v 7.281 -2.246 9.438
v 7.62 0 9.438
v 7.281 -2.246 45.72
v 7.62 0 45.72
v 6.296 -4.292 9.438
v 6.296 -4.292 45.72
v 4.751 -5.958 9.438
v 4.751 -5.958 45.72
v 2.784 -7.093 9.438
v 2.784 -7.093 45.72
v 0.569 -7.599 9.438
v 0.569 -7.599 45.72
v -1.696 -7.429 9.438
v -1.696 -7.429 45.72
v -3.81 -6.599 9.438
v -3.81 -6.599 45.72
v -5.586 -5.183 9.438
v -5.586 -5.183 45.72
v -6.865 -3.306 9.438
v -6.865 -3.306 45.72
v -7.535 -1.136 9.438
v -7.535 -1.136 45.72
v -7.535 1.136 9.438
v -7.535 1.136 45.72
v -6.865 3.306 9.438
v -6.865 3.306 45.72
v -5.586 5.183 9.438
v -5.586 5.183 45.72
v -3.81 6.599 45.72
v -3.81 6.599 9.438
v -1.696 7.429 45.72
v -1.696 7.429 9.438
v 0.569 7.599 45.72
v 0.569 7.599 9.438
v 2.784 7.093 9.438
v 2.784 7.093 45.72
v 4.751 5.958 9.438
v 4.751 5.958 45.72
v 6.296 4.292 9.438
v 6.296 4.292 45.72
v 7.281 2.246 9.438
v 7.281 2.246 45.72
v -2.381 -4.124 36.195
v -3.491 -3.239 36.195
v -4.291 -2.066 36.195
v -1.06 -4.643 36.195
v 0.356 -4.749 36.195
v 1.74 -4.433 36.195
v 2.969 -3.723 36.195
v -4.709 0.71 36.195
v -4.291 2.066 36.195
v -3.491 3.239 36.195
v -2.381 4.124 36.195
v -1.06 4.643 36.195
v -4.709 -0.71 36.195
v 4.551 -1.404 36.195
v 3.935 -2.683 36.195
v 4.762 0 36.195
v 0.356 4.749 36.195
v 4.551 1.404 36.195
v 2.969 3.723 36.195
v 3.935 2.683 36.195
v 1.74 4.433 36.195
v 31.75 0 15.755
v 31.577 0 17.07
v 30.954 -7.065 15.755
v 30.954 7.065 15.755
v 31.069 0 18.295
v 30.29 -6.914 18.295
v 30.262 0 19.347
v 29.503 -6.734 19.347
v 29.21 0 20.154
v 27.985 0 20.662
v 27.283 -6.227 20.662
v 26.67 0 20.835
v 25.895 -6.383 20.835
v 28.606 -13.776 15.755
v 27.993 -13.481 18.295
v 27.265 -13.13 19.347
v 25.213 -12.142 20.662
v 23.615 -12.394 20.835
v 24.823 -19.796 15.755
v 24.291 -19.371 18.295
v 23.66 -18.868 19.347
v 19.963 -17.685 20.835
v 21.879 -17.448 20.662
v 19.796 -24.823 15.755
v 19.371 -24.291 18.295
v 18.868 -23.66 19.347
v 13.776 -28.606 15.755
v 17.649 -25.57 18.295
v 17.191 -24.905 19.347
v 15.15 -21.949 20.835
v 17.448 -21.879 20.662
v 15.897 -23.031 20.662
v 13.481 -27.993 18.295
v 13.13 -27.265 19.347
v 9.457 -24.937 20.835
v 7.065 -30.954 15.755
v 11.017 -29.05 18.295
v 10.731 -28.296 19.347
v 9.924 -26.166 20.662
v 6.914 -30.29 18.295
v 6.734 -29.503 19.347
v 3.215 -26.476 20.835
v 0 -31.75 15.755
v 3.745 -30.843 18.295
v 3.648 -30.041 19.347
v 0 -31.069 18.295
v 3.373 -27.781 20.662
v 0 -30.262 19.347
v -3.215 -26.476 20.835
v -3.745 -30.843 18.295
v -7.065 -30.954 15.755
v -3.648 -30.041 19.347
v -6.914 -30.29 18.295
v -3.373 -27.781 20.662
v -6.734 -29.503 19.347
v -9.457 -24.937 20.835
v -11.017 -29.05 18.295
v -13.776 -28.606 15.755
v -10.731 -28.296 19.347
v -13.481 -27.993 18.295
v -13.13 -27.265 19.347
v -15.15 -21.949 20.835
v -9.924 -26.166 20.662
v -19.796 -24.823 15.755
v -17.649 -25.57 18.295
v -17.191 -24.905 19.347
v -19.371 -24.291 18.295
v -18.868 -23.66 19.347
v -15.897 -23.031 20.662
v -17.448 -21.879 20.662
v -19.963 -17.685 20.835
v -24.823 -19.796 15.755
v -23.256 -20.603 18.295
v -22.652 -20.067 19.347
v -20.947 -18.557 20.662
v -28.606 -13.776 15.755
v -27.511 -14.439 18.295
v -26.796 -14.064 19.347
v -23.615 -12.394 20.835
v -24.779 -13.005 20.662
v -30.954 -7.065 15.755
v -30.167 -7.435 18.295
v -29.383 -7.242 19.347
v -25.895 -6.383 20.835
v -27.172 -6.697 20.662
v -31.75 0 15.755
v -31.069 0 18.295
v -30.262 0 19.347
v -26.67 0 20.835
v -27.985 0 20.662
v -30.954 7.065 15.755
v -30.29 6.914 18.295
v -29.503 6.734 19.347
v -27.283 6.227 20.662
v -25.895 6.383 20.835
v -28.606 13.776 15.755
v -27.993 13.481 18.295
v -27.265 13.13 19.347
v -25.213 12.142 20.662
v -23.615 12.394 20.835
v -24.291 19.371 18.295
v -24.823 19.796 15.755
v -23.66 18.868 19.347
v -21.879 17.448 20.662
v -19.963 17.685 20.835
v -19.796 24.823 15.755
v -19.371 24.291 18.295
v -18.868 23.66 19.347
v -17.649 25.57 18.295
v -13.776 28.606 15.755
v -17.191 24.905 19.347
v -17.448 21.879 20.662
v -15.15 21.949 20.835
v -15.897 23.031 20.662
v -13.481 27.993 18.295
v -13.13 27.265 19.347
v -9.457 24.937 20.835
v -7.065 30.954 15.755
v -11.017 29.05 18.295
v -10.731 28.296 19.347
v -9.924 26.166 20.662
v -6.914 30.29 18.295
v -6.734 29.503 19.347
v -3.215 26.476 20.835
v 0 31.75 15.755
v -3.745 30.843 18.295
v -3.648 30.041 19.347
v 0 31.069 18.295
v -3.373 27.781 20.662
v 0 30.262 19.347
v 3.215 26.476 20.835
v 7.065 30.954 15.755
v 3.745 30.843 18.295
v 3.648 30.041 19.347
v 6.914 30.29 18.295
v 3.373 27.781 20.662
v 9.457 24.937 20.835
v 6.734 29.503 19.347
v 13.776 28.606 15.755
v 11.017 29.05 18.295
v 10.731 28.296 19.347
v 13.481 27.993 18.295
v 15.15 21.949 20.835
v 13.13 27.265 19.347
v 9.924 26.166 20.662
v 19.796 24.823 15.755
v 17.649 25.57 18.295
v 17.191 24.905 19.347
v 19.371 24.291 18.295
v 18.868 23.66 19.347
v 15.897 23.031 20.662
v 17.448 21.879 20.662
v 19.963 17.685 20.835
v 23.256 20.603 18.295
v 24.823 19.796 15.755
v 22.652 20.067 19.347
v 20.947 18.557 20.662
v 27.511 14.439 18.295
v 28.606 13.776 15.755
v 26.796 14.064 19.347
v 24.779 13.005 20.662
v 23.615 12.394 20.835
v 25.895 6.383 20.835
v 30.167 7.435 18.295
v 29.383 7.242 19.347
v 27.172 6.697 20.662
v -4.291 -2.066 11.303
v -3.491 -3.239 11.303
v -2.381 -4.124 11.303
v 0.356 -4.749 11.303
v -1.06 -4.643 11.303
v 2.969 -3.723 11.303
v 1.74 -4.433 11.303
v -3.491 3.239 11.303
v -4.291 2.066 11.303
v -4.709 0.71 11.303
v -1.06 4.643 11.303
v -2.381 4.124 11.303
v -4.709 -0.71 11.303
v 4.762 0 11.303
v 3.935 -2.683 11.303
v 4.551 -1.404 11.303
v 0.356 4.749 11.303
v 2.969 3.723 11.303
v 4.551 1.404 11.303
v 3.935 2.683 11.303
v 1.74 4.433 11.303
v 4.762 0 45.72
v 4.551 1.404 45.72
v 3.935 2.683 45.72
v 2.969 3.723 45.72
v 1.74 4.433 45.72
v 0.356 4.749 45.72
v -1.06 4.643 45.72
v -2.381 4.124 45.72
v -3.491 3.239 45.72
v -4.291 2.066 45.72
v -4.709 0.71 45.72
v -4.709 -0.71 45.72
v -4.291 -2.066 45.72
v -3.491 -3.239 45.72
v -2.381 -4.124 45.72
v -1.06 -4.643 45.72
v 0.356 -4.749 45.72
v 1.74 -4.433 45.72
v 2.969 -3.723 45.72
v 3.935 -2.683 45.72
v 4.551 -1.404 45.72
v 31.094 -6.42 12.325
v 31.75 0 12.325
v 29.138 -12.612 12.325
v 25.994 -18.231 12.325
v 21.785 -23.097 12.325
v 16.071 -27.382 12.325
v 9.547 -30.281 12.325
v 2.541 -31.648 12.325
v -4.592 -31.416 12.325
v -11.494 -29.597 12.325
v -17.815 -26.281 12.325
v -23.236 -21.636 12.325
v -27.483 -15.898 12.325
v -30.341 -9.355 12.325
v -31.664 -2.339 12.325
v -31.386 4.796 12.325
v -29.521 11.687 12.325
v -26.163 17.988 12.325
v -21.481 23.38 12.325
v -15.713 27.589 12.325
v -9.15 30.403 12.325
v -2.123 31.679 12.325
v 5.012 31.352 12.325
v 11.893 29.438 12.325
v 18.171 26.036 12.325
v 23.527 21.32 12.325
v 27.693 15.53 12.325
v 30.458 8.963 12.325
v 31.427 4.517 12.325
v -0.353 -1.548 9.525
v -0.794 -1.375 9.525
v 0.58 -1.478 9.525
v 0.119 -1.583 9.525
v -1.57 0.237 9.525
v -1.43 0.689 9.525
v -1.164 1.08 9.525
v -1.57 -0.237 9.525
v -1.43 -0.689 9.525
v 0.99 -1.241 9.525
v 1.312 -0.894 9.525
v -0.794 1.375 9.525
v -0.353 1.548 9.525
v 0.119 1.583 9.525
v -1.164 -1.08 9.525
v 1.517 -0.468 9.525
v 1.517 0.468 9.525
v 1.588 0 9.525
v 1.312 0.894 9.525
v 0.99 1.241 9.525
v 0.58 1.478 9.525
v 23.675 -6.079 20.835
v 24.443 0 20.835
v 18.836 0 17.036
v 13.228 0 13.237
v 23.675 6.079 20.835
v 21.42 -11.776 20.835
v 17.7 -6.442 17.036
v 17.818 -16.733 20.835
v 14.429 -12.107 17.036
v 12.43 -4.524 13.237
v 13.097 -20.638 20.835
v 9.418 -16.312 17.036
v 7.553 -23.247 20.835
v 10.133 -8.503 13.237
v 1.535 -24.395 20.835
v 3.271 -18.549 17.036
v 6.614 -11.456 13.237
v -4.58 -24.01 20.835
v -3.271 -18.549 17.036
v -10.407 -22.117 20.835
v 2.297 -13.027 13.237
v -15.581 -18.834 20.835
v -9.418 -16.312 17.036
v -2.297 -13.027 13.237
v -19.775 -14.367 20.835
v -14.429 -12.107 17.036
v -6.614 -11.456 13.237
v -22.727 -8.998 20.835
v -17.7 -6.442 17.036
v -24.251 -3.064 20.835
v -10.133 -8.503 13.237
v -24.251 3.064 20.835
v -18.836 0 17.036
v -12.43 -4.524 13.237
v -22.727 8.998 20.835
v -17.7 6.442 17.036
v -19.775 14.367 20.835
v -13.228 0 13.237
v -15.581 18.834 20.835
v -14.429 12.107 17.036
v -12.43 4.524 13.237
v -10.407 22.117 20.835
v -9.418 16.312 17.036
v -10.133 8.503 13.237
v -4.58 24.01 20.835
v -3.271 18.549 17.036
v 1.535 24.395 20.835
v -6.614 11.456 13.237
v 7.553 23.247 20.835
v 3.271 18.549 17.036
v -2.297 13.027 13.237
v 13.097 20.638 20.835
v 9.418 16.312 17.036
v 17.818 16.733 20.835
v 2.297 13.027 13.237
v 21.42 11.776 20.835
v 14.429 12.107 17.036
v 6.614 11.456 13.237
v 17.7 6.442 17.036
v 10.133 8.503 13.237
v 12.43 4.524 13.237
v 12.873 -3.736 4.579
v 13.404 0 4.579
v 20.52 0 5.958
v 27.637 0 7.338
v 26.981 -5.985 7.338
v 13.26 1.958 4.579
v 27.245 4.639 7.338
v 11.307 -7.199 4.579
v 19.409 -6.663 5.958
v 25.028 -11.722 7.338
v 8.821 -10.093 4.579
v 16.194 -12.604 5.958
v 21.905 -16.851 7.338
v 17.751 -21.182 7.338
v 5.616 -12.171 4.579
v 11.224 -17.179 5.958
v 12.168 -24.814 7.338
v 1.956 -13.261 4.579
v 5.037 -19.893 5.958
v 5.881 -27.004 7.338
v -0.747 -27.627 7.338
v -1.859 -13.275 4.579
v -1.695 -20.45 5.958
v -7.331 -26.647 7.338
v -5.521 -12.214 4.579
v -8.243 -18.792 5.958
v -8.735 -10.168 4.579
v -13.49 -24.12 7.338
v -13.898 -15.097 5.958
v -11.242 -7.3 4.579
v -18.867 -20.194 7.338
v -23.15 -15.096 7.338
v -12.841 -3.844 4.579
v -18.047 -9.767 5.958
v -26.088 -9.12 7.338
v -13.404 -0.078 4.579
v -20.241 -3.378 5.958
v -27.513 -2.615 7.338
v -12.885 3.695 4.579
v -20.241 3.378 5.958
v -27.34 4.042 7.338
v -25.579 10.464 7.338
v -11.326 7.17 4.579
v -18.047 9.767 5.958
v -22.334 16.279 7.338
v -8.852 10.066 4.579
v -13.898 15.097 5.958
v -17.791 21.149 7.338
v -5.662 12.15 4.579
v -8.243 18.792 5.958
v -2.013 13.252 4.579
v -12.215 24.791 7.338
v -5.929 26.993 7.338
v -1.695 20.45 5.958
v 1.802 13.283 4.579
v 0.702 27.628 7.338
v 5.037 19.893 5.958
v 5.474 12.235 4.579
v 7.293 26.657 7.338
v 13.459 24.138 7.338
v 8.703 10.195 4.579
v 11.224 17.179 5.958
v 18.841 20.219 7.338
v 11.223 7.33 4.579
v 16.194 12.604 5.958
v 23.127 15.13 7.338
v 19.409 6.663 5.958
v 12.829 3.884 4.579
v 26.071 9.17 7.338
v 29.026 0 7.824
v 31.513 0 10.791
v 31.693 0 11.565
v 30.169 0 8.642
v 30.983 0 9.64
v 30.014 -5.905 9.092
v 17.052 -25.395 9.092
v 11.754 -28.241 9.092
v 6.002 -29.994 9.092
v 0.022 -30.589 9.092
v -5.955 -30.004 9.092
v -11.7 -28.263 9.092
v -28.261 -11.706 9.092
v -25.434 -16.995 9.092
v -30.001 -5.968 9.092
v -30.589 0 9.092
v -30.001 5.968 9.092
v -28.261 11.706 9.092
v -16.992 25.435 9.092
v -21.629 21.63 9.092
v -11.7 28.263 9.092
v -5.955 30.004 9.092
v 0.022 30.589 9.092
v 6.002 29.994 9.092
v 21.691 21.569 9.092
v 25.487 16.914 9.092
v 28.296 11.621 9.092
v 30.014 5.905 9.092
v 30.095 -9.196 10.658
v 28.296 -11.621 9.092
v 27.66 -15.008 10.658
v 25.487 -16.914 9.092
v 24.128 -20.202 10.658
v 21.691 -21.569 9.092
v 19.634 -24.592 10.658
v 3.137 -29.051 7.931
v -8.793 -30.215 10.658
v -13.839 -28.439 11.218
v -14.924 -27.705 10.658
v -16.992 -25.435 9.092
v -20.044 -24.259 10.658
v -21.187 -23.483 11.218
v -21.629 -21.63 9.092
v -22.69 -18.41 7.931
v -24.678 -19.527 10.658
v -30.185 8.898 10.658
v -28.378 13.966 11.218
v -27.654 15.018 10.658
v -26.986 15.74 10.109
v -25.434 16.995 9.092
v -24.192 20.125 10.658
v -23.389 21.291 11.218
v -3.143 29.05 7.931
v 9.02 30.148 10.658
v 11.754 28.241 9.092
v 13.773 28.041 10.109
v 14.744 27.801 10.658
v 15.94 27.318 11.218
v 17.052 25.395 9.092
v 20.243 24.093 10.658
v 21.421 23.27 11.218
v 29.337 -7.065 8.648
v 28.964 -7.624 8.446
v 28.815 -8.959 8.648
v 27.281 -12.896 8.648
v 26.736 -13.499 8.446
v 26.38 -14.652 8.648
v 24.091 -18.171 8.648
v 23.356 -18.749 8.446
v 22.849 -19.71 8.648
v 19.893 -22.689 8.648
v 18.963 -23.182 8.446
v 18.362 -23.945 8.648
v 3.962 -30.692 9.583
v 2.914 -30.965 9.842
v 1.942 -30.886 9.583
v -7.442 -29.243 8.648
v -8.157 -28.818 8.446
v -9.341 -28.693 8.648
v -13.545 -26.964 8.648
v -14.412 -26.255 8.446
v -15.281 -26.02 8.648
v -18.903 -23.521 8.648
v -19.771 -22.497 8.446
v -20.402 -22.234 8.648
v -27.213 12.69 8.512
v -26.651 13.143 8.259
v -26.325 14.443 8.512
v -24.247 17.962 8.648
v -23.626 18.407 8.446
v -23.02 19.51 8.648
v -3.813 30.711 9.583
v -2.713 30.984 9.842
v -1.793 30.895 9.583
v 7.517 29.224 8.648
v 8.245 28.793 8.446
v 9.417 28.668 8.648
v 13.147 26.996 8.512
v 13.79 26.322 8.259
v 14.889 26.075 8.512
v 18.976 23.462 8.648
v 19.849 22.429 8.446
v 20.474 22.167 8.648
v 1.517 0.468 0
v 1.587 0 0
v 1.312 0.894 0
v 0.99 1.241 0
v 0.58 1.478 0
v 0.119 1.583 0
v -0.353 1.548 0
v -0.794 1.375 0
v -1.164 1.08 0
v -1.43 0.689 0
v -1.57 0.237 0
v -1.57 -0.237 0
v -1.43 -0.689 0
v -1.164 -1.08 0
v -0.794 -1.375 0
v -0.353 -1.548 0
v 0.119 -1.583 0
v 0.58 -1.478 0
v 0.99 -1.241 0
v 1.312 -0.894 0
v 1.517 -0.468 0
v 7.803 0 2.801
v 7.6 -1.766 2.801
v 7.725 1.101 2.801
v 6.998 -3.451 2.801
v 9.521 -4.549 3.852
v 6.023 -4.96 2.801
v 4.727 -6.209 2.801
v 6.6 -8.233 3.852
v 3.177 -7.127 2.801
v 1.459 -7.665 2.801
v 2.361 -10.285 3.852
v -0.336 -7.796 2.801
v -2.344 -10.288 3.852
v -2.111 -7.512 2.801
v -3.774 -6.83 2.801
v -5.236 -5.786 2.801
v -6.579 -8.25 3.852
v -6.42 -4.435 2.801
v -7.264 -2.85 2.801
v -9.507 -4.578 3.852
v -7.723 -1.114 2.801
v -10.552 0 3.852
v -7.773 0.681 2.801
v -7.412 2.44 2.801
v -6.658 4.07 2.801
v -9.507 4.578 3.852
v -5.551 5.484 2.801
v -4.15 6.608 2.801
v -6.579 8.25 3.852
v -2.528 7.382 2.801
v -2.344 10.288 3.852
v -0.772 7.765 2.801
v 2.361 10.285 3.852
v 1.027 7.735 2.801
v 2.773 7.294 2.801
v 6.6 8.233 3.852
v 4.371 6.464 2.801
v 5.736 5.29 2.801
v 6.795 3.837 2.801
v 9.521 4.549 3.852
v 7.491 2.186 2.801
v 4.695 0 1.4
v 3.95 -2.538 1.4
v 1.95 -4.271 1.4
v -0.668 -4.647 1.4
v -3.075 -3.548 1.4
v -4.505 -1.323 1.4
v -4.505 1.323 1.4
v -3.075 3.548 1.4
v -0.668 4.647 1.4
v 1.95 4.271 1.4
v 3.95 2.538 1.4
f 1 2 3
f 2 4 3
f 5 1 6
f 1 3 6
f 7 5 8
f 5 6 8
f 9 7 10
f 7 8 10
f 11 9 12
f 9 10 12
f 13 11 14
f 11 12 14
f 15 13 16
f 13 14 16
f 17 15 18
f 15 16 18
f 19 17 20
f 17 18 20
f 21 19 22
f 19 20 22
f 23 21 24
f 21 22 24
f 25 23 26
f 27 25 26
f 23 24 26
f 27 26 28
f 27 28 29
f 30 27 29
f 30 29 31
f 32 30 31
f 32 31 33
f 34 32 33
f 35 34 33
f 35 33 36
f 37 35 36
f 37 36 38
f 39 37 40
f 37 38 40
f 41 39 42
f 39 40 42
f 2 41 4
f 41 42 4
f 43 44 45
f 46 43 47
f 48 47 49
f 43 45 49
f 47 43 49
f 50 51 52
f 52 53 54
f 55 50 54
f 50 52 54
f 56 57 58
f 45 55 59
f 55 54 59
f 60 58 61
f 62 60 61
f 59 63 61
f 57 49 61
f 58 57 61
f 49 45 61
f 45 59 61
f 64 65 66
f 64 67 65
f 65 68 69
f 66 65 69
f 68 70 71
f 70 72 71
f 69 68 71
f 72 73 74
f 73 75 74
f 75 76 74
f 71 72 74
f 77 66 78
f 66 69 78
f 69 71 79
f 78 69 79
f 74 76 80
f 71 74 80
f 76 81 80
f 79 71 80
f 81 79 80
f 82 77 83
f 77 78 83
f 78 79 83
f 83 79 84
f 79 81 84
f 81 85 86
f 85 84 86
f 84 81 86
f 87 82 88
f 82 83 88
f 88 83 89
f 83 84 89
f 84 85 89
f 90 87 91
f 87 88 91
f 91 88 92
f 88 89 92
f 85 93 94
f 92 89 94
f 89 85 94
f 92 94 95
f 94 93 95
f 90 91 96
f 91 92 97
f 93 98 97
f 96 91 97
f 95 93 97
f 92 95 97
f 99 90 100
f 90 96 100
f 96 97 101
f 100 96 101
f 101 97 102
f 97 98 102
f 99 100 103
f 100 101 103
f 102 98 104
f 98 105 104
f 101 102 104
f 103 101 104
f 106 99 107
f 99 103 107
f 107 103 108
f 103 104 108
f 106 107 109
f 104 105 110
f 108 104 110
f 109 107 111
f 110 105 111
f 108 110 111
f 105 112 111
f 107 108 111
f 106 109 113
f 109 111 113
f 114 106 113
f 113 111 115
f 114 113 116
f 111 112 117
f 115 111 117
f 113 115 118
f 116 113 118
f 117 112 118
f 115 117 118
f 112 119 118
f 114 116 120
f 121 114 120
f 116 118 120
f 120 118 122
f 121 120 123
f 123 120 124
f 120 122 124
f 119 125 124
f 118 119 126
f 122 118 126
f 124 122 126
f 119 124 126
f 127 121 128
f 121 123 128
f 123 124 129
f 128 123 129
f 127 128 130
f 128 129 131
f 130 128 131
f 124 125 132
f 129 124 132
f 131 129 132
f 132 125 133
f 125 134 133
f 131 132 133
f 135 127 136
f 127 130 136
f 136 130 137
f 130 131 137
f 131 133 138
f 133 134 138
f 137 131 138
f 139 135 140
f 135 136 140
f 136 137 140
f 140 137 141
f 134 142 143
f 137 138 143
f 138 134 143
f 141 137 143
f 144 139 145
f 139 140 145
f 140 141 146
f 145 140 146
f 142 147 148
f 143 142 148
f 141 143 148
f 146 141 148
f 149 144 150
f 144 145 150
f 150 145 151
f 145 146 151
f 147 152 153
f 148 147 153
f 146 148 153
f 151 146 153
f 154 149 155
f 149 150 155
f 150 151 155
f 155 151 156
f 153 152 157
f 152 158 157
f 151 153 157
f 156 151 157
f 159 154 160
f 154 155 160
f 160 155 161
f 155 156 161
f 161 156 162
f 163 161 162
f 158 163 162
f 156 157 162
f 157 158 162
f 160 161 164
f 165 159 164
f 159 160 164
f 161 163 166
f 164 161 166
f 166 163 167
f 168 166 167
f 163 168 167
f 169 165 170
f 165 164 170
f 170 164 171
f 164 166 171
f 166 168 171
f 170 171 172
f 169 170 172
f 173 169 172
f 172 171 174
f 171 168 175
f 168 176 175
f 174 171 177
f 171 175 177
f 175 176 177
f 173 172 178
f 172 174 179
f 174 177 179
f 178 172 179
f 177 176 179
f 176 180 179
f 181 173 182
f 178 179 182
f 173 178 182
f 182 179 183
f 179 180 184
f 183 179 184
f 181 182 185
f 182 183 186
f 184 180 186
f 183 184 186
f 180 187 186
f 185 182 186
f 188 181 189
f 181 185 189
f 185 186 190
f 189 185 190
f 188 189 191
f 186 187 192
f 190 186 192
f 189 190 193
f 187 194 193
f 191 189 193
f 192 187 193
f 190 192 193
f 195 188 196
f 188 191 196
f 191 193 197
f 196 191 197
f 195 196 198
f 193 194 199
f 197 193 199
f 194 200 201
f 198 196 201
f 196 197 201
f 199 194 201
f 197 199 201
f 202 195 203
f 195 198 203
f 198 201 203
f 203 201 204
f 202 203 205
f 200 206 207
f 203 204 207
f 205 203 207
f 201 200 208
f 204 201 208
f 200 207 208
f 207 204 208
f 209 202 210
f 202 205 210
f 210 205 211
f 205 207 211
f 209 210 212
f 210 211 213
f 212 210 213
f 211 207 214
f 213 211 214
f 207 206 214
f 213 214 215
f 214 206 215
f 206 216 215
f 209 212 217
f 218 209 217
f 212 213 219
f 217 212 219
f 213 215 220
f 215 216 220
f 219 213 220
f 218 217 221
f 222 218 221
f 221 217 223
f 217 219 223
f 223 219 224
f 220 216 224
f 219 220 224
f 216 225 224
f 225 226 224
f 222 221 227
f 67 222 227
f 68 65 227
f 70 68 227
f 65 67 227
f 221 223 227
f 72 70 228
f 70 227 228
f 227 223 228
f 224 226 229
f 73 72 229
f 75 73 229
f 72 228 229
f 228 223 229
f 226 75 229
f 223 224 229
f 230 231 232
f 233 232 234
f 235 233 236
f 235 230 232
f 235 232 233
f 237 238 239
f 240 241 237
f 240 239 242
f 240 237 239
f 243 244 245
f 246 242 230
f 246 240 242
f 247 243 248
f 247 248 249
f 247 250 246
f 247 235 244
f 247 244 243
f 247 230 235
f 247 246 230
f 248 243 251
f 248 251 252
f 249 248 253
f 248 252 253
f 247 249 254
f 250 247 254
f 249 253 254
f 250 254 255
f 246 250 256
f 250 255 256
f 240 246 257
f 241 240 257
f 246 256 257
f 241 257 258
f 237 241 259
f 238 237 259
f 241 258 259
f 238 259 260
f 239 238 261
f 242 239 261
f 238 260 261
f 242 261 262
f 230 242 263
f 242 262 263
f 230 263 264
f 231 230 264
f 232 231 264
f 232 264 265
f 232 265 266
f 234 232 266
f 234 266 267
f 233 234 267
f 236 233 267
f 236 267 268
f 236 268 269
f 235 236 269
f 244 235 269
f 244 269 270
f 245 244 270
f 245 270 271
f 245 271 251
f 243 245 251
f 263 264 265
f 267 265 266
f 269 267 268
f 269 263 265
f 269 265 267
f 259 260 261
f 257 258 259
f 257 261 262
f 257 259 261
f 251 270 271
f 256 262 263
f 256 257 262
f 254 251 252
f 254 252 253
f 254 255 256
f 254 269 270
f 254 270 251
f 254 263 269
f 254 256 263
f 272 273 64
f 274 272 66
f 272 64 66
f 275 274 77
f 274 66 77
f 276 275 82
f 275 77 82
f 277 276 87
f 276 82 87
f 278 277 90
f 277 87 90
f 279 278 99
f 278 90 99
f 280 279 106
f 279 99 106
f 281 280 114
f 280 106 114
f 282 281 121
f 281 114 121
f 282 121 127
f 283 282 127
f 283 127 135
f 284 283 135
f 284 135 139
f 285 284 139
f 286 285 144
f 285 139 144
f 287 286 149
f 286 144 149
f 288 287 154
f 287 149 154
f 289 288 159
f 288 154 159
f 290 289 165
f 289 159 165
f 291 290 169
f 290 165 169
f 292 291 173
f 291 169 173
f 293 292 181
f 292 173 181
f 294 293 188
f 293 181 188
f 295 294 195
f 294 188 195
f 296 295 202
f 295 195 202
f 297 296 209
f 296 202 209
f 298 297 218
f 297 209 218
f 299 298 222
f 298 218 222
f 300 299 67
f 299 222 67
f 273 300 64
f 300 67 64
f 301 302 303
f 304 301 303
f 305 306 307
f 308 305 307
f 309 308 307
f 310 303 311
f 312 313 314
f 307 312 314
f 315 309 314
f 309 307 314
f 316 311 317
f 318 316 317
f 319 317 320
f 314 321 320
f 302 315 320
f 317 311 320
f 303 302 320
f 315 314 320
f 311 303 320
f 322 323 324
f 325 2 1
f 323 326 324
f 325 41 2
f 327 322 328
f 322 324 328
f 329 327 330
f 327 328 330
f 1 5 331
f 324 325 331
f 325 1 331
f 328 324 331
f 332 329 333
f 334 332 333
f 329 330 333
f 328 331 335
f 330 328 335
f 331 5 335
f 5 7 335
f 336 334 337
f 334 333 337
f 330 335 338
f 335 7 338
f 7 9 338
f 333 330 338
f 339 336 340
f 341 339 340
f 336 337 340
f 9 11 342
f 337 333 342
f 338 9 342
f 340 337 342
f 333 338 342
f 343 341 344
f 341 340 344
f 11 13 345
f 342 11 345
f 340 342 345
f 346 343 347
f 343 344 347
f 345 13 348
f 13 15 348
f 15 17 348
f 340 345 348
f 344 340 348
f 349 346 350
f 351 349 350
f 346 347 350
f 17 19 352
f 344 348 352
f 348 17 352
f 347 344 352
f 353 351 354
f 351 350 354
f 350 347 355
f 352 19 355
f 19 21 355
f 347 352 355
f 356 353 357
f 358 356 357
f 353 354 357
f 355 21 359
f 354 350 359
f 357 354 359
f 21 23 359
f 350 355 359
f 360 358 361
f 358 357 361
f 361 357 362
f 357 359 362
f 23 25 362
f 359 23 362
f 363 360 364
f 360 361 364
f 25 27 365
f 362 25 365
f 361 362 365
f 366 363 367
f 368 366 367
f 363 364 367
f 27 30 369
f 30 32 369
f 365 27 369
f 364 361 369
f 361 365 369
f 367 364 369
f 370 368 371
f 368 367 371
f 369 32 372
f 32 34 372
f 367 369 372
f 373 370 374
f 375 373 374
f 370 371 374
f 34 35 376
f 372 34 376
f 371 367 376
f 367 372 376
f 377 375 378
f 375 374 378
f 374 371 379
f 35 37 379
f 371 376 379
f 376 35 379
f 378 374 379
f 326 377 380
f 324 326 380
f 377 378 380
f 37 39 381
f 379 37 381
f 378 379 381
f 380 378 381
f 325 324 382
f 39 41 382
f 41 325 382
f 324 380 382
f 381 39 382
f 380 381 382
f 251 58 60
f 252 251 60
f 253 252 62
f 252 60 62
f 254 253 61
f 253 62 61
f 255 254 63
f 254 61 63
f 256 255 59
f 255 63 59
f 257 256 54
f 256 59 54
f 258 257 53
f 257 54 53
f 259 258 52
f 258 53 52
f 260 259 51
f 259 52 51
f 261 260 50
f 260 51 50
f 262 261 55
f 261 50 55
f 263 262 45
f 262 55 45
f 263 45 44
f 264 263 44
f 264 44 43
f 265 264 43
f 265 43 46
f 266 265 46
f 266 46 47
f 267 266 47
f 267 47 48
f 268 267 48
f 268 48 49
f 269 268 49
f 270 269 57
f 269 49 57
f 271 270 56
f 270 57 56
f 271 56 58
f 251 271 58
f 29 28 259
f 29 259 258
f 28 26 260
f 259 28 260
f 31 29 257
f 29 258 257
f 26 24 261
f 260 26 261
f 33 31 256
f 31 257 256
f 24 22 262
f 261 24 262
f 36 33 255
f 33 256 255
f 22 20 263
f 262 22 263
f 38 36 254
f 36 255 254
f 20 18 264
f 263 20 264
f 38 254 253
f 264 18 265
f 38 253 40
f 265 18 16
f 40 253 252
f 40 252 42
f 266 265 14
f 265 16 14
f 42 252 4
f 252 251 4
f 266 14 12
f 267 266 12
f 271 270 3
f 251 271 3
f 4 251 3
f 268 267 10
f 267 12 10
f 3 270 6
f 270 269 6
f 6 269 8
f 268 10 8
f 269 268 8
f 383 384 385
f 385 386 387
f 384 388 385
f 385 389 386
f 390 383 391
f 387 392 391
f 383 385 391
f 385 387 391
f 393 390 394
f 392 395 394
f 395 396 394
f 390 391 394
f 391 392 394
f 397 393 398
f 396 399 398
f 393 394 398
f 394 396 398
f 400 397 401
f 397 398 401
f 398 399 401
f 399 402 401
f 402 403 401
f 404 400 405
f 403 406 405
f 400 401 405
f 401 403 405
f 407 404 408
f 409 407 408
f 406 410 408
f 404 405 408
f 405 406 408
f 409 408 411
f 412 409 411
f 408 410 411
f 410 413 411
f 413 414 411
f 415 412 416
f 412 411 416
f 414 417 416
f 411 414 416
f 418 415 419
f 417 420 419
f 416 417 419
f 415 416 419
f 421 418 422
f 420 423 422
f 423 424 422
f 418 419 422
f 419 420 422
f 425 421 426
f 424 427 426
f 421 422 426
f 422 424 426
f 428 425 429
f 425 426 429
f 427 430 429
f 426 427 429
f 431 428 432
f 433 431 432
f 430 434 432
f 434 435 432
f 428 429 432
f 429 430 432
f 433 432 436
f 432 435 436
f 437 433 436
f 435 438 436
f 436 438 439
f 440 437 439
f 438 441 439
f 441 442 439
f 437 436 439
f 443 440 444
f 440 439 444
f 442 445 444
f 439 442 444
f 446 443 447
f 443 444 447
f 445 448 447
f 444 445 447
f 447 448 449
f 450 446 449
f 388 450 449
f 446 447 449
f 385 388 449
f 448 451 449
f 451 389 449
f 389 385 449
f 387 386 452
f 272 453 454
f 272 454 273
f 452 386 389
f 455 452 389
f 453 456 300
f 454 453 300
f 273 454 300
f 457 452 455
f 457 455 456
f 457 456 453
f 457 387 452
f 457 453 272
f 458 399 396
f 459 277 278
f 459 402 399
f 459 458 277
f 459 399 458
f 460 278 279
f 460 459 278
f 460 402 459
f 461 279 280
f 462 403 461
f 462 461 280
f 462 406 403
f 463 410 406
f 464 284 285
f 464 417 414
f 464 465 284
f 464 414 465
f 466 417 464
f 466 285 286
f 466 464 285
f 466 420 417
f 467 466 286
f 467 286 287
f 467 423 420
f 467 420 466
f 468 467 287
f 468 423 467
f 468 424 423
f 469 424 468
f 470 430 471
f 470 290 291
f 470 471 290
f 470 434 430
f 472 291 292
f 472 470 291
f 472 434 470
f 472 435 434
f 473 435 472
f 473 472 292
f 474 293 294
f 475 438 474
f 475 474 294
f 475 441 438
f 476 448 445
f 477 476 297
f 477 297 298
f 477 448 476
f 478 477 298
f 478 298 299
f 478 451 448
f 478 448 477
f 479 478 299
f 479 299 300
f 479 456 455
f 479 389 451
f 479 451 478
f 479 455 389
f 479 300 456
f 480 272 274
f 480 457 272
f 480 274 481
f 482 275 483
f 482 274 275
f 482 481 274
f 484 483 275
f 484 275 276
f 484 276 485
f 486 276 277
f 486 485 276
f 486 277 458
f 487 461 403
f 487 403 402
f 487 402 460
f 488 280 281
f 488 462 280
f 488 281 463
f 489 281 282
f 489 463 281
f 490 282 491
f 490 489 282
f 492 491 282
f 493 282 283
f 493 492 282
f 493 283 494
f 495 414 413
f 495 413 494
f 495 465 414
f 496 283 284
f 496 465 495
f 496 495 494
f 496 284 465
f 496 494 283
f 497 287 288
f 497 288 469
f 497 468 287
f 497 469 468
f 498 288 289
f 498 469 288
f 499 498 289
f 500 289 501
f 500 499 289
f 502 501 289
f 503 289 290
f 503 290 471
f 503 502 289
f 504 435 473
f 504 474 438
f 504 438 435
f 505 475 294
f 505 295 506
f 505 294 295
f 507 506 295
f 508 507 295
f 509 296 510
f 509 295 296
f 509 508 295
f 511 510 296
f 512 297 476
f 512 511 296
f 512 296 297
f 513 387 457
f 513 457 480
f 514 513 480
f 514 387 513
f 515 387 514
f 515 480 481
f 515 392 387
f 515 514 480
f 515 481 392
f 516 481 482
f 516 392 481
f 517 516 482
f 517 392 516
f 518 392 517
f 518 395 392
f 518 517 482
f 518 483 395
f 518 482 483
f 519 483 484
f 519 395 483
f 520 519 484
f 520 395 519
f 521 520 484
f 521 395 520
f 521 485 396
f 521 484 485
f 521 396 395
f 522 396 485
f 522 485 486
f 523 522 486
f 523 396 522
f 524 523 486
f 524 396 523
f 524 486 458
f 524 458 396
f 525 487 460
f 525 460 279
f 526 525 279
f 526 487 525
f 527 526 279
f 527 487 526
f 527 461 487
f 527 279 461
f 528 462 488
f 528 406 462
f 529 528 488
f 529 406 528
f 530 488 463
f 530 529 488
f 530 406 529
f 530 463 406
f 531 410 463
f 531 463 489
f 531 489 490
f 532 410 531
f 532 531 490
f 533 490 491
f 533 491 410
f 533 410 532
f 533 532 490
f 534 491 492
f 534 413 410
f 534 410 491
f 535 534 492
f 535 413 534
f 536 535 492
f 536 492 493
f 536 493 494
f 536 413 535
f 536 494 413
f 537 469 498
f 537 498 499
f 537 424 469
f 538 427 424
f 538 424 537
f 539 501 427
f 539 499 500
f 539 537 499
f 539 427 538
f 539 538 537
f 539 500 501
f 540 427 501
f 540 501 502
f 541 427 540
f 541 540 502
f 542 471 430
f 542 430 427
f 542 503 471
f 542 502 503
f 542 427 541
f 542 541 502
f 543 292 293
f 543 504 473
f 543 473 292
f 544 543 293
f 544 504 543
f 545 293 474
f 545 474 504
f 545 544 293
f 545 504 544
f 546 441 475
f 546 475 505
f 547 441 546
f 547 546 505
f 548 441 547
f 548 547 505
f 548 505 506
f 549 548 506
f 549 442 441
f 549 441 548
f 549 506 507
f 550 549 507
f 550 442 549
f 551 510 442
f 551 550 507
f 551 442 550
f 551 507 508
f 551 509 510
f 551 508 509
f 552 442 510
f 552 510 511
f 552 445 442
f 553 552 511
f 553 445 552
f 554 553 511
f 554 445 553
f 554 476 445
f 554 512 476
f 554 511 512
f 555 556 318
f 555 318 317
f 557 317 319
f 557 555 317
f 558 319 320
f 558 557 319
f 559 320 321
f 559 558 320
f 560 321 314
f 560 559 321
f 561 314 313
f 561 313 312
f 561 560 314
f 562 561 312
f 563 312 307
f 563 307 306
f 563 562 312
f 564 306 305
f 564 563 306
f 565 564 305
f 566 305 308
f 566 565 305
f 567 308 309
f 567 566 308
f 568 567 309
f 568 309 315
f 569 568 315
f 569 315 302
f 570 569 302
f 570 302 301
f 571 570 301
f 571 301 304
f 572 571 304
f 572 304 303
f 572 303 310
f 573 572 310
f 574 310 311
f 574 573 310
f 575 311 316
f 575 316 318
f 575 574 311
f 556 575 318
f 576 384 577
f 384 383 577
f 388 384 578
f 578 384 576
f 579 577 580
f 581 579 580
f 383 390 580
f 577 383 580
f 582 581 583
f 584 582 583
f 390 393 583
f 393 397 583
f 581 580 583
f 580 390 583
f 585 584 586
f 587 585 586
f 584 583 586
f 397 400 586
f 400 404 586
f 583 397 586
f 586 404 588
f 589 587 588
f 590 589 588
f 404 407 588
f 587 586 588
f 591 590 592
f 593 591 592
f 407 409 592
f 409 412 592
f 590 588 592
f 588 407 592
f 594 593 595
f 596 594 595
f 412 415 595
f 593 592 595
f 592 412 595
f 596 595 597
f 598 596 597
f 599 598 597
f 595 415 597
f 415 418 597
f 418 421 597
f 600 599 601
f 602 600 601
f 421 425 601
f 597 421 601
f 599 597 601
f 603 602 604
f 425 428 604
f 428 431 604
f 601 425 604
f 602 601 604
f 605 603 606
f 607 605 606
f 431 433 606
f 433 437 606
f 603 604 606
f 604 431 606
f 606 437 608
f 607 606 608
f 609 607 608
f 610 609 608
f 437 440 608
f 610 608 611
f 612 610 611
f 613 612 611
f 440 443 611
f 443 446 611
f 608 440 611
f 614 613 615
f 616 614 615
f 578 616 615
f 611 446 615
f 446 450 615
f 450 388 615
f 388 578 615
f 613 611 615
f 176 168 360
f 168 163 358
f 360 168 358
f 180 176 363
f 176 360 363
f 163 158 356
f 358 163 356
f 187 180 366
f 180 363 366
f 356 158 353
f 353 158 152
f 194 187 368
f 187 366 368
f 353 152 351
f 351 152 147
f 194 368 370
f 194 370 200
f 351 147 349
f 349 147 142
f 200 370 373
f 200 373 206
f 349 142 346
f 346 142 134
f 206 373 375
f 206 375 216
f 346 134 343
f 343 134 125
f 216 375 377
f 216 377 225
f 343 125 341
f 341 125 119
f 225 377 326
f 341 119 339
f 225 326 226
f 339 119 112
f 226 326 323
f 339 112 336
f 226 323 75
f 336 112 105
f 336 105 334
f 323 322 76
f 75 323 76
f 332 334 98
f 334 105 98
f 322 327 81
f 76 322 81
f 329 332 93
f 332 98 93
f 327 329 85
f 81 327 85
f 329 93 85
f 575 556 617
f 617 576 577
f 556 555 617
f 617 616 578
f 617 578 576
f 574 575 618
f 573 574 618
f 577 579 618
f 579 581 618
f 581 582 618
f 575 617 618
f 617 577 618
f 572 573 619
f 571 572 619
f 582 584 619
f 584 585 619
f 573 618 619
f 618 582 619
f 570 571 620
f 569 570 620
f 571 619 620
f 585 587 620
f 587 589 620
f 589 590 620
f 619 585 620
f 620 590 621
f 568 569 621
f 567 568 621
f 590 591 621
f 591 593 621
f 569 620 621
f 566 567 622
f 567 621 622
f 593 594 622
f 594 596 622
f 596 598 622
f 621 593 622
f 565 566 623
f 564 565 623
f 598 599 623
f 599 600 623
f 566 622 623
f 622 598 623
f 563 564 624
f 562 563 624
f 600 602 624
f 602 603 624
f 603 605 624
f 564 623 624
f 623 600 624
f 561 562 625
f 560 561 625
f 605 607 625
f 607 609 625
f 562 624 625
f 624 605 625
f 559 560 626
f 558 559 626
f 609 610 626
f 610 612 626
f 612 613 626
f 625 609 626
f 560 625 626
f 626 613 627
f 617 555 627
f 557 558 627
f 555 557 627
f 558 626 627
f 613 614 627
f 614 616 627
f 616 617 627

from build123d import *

# Parameters (mm, degrees)
F2_R      = 5.08
F3_R      = 25.4
F4_R      = 4.7625
F5_DEPTH  = 9.525
F6_R      = 1.5875
F7_DEPTH  = 9.525
F5_FACE_R = 4.7625
F8_DEPTH  = 9.525
F9_DEPTH  = 24.892


with BuildPart() as f1:
    # F0 (on Front) → F1 (revolve)
    with BuildSketch(Plane.XZ):
        Polygon((10.500061, 4.015946), (31.75, 8.134865), (31.75, 20.834865), (24.443309, 20.834865), (7.62, 9.438433), (7.62, 45.72), (0, 45.72), (0, 0), (1.5875, 0), align=None)
    revolve(axis=Axis((0, 0, 22.86), (0, 0, -1)))

    # F2
    f2_edges = [f1.edges().sort_by_distance(p)[0] for p in [
        (-31.75, 0, 8.134865),
        (-31.75, 0, 20.834865),
        (31.75, 0, 14.484865),
    ]]
    fillet(f2_edges, radius=F2_R)

    # F3
    f3_edges = [f1.edges().sort_by_distance(p)[0] for p in [
        (-10.500061, 0, 4.015946),
    ]]
    fillet(f3_edges, radius=F3_R)

    # F4 (on face) → F5 (cut)
    with BuildSketch(Plane.XY.offset(45.72)):
        Circle(F4_R)
    extrude(amount=-F5_DEPTH, mode=Mode.SUBTRACT)

    # F6 (on Top) → F7 (cut)
    with BuildSketch(Plane.XY):
        Circle(F6_R)
    extrude(amount=F7_DEPTH, mode=Mode.SUBTRACT)

    # F5_face (on face) → F9 (cut)
    with BuildSketch(Plane.XY.offset(36.195)):
        Circle(F5_FACE_R)
    extrude(amount=-F9_DEPTH, mode=Mode.SUBTRACT)


with BuildPart() as f8:
    # F5_face (on face) → F8 (new body)
    with BuildSketch(Plane.XY.offset(36.195)):
        Circle(F5_FACE_R)
    extrude(amount=F8_DEPTH)


solid = Compound([f1.part, f8.part])
